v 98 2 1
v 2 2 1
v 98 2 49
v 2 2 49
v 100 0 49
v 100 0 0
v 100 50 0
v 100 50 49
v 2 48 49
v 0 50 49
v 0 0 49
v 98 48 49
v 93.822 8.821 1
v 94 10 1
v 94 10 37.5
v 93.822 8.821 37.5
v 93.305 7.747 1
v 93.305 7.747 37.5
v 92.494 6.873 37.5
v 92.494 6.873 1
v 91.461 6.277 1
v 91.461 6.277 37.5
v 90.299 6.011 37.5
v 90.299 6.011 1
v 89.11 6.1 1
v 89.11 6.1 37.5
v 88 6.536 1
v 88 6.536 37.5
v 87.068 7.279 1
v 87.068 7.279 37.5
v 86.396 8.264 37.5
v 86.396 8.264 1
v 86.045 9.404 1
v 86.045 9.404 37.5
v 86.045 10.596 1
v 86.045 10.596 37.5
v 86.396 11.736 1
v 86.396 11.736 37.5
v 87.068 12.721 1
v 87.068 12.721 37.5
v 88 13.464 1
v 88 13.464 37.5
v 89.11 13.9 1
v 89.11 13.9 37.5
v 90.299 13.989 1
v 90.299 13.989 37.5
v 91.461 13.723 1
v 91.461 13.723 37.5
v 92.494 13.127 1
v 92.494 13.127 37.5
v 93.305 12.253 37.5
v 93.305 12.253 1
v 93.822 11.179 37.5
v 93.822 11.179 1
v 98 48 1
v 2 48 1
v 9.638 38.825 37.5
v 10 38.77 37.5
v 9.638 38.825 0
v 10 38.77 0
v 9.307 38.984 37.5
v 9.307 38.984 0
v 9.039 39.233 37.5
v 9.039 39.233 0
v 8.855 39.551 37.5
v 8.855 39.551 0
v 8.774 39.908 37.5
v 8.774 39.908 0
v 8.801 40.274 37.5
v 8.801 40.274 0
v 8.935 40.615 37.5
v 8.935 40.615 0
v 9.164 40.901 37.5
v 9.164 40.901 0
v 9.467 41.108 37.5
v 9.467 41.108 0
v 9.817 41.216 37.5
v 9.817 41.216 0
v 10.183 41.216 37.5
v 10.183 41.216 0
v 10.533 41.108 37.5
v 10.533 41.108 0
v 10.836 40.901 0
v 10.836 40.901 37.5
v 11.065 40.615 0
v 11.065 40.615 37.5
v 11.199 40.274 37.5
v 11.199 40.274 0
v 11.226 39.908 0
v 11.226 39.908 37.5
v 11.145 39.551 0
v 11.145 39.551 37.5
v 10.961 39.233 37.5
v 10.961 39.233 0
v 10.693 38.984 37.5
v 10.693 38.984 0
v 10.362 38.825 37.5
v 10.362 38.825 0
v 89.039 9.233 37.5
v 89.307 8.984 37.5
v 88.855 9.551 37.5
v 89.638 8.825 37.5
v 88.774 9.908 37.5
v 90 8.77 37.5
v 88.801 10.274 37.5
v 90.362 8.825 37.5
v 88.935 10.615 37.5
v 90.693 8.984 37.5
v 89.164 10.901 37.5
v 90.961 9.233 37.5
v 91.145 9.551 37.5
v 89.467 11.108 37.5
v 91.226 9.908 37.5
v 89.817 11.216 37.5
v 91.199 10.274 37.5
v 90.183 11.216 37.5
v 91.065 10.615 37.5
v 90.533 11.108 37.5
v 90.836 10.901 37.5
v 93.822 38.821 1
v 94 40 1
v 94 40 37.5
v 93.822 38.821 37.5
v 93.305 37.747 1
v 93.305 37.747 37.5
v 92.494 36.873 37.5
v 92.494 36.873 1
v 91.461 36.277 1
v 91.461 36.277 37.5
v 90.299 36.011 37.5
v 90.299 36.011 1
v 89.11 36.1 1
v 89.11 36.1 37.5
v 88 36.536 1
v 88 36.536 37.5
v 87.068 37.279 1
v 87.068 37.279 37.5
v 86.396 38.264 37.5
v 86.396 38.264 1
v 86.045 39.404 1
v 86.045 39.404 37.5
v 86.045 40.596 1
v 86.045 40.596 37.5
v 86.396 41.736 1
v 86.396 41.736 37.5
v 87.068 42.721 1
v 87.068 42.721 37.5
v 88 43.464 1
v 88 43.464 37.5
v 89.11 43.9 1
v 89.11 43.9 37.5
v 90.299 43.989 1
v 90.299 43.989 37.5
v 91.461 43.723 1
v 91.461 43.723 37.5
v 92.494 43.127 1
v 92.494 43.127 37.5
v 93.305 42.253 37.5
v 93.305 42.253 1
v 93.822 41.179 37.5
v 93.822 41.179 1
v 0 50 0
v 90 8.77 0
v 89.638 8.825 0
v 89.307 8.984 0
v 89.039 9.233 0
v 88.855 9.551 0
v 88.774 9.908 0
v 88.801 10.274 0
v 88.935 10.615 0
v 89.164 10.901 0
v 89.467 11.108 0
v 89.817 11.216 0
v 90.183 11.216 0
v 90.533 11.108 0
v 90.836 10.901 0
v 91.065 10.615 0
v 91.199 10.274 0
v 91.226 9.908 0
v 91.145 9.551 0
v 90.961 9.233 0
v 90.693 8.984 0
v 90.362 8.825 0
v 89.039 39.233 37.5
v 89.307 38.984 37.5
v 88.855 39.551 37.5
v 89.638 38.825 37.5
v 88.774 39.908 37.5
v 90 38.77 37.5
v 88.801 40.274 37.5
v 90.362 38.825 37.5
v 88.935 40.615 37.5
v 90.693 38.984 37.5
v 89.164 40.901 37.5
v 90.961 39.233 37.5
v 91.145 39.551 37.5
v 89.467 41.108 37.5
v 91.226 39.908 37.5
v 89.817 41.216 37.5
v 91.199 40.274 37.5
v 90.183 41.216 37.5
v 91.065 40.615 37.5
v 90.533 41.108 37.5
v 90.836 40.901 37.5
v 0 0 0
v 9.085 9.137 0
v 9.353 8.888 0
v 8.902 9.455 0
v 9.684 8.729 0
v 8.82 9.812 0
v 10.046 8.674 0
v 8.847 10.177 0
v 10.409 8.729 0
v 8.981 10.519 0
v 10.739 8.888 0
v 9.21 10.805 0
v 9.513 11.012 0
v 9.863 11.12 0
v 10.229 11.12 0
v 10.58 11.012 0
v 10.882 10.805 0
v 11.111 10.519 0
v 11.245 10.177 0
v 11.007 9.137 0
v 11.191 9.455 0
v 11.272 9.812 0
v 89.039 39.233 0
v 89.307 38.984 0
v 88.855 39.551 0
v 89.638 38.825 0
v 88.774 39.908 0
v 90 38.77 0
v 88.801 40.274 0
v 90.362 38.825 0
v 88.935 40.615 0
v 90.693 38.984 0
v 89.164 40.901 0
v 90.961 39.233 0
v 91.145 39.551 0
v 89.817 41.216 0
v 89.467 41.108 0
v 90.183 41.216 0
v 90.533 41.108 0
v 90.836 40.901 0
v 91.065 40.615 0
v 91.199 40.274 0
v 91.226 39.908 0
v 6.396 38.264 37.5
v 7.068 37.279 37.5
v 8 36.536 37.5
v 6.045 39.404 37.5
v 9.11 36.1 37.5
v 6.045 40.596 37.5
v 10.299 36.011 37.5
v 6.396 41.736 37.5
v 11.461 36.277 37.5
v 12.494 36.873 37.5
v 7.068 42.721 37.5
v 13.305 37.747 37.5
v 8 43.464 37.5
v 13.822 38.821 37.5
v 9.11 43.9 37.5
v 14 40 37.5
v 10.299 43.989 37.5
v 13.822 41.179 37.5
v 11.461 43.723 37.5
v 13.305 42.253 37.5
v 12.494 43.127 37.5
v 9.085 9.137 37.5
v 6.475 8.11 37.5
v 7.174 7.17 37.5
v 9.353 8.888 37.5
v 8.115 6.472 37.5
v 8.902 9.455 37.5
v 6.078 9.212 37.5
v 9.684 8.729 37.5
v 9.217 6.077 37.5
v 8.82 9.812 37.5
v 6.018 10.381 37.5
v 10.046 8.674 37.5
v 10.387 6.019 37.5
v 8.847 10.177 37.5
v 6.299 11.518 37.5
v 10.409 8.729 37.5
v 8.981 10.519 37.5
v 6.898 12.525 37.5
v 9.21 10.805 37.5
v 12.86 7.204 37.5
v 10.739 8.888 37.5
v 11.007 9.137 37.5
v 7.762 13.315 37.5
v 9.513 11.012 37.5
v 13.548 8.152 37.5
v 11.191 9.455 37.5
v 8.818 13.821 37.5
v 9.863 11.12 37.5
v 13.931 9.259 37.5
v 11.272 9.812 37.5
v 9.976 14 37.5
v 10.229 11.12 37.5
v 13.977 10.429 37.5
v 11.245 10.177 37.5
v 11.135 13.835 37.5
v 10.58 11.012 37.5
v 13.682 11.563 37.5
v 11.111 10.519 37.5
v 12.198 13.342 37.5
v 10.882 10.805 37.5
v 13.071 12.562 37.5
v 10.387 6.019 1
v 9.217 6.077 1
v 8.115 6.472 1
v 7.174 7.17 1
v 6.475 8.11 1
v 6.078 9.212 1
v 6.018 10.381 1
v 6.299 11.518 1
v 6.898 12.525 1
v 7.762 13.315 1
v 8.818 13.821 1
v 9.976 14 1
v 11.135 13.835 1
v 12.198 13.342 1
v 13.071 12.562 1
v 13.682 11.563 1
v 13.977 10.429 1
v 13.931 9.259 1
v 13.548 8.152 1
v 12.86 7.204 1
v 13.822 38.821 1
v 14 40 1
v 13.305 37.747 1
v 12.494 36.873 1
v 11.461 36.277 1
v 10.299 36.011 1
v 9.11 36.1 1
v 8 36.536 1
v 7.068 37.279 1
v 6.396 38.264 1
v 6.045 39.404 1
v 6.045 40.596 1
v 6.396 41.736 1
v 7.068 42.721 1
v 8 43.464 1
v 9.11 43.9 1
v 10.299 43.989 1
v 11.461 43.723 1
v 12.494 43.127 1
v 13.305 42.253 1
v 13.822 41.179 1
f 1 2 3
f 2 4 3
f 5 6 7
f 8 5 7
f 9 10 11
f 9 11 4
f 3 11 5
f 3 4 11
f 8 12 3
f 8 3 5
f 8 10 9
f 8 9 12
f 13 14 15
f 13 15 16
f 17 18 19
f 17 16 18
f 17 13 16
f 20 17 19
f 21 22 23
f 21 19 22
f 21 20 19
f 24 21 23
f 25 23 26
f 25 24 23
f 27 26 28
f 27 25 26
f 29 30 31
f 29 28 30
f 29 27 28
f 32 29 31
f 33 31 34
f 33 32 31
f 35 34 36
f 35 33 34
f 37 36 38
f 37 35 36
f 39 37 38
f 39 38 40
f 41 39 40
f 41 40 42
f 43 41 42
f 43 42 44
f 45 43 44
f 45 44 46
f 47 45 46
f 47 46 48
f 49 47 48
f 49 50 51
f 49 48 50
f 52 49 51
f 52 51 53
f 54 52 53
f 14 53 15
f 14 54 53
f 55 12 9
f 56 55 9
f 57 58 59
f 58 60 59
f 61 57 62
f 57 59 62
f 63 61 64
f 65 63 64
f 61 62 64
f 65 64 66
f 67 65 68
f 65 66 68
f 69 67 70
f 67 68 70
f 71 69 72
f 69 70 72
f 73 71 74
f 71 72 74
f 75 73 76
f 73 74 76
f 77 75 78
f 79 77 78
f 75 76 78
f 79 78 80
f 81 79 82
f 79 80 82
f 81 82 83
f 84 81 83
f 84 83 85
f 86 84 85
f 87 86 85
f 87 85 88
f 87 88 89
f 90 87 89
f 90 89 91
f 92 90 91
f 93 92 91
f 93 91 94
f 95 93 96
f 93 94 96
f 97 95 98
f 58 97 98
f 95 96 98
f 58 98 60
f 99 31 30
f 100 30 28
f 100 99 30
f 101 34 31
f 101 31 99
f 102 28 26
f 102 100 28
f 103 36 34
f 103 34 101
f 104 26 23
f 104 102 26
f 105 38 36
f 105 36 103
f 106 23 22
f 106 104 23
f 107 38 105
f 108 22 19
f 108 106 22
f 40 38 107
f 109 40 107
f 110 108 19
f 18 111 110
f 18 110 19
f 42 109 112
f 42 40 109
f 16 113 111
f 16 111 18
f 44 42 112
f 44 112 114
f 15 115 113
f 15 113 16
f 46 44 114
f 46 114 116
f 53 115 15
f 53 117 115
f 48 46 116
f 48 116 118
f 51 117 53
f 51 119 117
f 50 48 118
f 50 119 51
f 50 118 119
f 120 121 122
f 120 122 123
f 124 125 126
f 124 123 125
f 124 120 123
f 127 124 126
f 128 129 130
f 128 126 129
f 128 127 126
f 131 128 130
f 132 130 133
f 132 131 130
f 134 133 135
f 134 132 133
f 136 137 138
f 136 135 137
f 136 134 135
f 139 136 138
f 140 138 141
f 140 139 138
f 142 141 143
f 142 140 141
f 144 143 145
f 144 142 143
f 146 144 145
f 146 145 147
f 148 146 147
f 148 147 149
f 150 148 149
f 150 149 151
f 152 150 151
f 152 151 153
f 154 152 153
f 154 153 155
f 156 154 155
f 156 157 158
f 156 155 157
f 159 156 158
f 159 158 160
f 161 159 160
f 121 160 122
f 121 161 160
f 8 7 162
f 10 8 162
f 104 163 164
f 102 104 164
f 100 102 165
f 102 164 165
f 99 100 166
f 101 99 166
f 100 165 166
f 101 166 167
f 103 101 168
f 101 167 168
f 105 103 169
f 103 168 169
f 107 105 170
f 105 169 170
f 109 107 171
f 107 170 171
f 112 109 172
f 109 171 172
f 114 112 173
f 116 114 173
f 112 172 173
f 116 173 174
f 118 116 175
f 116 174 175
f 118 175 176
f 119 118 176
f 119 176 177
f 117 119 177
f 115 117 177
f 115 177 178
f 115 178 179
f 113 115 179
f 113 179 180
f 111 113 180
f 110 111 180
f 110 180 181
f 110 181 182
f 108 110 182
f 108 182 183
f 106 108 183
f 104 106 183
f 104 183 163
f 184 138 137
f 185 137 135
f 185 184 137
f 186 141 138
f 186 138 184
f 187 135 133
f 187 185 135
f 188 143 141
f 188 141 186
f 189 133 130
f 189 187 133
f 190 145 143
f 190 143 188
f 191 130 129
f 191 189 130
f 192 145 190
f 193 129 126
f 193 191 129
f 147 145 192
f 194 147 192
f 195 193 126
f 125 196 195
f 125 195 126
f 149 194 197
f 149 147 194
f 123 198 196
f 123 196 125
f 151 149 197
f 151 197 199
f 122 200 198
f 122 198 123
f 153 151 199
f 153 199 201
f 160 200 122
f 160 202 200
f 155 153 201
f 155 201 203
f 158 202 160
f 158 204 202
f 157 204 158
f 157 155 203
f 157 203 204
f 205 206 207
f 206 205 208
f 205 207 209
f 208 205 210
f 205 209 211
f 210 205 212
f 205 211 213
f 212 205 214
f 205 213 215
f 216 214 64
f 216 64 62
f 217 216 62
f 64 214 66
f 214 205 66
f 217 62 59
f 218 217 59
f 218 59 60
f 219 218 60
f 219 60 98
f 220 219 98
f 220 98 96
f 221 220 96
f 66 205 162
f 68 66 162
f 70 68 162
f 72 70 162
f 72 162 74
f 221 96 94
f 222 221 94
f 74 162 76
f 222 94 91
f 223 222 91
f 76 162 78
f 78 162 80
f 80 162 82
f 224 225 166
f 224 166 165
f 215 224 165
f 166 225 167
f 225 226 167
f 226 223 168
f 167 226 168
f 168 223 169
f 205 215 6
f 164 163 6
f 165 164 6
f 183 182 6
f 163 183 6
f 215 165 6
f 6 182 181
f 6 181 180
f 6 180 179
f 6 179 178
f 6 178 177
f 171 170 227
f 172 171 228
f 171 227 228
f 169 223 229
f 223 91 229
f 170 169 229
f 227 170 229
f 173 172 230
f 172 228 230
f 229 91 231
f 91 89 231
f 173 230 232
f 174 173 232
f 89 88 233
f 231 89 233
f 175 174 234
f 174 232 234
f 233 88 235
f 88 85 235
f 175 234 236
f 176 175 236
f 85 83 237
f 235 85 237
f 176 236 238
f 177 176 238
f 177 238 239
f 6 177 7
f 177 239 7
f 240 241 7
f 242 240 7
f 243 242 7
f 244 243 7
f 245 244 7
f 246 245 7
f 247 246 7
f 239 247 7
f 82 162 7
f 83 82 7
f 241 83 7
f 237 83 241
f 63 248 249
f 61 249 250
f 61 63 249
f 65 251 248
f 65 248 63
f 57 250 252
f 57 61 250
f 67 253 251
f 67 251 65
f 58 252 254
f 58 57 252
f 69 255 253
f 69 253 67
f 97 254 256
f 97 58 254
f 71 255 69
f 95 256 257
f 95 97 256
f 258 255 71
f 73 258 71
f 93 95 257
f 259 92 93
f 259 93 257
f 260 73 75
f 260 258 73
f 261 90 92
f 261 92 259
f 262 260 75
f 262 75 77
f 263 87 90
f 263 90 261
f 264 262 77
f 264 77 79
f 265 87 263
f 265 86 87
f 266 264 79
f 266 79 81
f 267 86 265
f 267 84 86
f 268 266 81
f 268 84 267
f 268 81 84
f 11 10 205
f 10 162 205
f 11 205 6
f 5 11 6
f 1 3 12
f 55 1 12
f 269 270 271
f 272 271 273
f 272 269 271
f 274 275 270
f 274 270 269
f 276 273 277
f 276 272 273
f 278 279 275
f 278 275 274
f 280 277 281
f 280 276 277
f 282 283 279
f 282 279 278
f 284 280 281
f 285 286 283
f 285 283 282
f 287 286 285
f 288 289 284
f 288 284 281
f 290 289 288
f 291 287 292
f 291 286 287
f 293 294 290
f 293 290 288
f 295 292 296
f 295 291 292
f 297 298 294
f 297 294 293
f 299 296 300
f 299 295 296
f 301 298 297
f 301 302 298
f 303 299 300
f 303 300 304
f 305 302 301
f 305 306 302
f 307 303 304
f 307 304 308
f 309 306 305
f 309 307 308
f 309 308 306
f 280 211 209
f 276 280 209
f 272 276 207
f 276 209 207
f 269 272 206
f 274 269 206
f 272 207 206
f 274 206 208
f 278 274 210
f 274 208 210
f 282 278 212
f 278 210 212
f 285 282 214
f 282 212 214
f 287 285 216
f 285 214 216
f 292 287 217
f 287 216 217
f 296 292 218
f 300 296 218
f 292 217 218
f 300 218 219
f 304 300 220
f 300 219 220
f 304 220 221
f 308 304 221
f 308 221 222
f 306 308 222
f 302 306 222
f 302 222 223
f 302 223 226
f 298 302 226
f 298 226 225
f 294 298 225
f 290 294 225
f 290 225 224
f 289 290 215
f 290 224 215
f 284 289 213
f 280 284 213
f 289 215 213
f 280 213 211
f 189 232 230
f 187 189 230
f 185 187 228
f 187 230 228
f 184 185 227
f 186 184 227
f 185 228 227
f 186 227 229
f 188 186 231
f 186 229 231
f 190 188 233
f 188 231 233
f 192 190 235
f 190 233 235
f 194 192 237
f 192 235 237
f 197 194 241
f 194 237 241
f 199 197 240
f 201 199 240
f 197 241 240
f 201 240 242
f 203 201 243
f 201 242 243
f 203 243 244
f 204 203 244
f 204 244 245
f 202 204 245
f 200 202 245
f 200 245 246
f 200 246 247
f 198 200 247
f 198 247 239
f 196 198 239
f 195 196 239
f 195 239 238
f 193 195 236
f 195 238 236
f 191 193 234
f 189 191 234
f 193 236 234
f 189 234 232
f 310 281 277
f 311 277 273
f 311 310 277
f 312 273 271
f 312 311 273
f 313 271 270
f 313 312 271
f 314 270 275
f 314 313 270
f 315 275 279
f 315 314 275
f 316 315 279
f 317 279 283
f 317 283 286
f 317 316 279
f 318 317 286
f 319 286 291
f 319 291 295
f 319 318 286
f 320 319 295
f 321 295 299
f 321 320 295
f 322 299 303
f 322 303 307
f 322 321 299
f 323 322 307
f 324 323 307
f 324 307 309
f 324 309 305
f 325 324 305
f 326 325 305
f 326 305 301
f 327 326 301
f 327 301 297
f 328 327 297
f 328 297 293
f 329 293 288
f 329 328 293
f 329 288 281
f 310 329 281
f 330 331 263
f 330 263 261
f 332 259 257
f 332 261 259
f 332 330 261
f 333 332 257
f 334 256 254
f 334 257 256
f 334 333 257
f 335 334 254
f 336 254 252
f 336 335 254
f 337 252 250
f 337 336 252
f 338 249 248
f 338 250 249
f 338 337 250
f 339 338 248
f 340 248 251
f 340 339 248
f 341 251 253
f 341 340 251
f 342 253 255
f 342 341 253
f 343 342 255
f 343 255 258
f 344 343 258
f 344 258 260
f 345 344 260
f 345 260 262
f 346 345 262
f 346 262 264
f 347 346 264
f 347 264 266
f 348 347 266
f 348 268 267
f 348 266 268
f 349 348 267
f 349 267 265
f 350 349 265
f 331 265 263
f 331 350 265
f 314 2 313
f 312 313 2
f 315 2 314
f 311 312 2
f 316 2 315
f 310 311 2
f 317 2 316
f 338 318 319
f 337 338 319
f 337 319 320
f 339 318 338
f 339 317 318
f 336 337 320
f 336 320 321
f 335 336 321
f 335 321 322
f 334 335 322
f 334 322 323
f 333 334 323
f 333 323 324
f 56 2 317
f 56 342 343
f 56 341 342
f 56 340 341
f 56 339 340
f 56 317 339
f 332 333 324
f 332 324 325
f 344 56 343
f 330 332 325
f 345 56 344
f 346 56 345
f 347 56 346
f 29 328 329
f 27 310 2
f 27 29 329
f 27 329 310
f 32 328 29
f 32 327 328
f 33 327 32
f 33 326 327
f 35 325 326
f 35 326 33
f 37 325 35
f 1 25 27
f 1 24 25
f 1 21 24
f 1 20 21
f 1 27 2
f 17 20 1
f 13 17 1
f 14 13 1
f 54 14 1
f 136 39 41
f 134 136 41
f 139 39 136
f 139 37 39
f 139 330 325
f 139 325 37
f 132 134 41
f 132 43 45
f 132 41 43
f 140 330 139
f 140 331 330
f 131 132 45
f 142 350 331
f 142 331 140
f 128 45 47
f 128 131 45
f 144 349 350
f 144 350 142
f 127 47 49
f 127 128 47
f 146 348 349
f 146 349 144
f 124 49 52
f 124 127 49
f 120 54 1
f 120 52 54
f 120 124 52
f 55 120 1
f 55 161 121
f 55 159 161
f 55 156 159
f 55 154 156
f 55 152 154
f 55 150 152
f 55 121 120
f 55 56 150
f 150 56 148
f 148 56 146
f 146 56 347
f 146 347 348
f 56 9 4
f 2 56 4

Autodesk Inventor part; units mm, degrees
ref_plane "YZ Plane" through (0, 0, 0) normal (1, 0, 0) x (0, 1, 0)
ref_plane "XZ Plane" through (0, 0, 0) normal (0, 1, 0) x (-1, 0, 0)
ref_plane "XY Plane" through (0, 0, 0) normal (0, 0, 1) x (1, 0, 0)
sketch "Náčrt1" plane through (0, 0, 0) normal (0, 0, 1) x (1, 0, 0)
  line L0 (0, 0) -> (100, 0)
  line L1 (100, 0) -> (100, 50)
  line L2 (100, 50) -> (0, 50)
  line L3 (0, 50) -> (0, 0)
  dimension "d0" = 100
  dimension "d1" = 50
extrude "Vysunutí1" add sketch "Náčrt1" along normal blind 49
sketch "Náčrt2" plane through (0, 0, 49) normal (0, 0, 1) x (1, 0, 0)
  line L0 (2, 2) -> (98, 2)
  line L1 (98, 2) -> (98, 48)
  line L2 (98, 48) -> (2, 48)
  line L3 (2, 48) -> (2, 2)
  point P0 (0, 0)
  dimension "d4" = 96
  dimension "d5" = 46
extrude "Vysunutí2" cut sketch "Náčrt2" against normal blind 48
sketch "Náčrt3" plane through (0, 0, 1) normal (0, 0, 1) x (1, 0, 0)
  circle A0 centre (10, 10) radius 4
  line L0 (98, 48) -> (98, 2) projected
  line L1 (2, 48) -> (98, 48) projected
  line L2 (2, 2) -> (2, 48) projected
  line L3 (98, 2) -> (2, 2) projected
  circle A1 centre (10, 40) radius 4
  circle A2 centre (90, 10) radius 4
  circle A3 centre (90, 40) radius 4
  line L4 (98, 2) -> (2, 2) projected
  line L5 (50, 25) -> (2, 2)
  point P0 (0, 0)
  point P1 (10.387, 6.0188)
  point P2 (12.8605, 7.204)
  dimension "d8" = 8
  dimension "d11" = 30
  dimension "d14" = 80
  dimension "d19" = 25.602
  dimension "d20" = 40
  dimension "d22" = 15
  dimension "d23" = 48
extrude "Vysunutí3" add sketch "Náčrt3" along normal blind 36.5 contours A0 L5 | A1 | A2 | A3 picked at (11.6868, 9.0428)
hole "Díra1" at (10.0461, 9.9039, 37.5) direction (0, 0, -1) diameter 2.459 end through all thread size "M3x0.5" class "6H" standard "ISO Metric profile"
sketch "Náčrt4" plane through (0, 0, 0) normal (0, 0, -1) x (-1, 0, 0)
  point P0 (0, 0)
hole "Díra2" at (90, 40, 37.5) direction (0, 0, -1) diameter 2.459 end through all thread size "M3x0.5" class "6H" standard "ISO Metric profile"
hole "Díra3" at (90, 10, 37.5) direction (0, 0, -1) diameter 2.459 end through all thread size "M3x0.5" class "6H" standard "ISO Metric profile"
hole "Díra4" at (10, 40, 37.5) direction (0, 0, -1) diameter 2.459 end through all thread size "M3x0.5" class "6H" standard "ISO Metric profile"
equation "\"d22\" = 0.5 * d11"
properties part number "bottom"
